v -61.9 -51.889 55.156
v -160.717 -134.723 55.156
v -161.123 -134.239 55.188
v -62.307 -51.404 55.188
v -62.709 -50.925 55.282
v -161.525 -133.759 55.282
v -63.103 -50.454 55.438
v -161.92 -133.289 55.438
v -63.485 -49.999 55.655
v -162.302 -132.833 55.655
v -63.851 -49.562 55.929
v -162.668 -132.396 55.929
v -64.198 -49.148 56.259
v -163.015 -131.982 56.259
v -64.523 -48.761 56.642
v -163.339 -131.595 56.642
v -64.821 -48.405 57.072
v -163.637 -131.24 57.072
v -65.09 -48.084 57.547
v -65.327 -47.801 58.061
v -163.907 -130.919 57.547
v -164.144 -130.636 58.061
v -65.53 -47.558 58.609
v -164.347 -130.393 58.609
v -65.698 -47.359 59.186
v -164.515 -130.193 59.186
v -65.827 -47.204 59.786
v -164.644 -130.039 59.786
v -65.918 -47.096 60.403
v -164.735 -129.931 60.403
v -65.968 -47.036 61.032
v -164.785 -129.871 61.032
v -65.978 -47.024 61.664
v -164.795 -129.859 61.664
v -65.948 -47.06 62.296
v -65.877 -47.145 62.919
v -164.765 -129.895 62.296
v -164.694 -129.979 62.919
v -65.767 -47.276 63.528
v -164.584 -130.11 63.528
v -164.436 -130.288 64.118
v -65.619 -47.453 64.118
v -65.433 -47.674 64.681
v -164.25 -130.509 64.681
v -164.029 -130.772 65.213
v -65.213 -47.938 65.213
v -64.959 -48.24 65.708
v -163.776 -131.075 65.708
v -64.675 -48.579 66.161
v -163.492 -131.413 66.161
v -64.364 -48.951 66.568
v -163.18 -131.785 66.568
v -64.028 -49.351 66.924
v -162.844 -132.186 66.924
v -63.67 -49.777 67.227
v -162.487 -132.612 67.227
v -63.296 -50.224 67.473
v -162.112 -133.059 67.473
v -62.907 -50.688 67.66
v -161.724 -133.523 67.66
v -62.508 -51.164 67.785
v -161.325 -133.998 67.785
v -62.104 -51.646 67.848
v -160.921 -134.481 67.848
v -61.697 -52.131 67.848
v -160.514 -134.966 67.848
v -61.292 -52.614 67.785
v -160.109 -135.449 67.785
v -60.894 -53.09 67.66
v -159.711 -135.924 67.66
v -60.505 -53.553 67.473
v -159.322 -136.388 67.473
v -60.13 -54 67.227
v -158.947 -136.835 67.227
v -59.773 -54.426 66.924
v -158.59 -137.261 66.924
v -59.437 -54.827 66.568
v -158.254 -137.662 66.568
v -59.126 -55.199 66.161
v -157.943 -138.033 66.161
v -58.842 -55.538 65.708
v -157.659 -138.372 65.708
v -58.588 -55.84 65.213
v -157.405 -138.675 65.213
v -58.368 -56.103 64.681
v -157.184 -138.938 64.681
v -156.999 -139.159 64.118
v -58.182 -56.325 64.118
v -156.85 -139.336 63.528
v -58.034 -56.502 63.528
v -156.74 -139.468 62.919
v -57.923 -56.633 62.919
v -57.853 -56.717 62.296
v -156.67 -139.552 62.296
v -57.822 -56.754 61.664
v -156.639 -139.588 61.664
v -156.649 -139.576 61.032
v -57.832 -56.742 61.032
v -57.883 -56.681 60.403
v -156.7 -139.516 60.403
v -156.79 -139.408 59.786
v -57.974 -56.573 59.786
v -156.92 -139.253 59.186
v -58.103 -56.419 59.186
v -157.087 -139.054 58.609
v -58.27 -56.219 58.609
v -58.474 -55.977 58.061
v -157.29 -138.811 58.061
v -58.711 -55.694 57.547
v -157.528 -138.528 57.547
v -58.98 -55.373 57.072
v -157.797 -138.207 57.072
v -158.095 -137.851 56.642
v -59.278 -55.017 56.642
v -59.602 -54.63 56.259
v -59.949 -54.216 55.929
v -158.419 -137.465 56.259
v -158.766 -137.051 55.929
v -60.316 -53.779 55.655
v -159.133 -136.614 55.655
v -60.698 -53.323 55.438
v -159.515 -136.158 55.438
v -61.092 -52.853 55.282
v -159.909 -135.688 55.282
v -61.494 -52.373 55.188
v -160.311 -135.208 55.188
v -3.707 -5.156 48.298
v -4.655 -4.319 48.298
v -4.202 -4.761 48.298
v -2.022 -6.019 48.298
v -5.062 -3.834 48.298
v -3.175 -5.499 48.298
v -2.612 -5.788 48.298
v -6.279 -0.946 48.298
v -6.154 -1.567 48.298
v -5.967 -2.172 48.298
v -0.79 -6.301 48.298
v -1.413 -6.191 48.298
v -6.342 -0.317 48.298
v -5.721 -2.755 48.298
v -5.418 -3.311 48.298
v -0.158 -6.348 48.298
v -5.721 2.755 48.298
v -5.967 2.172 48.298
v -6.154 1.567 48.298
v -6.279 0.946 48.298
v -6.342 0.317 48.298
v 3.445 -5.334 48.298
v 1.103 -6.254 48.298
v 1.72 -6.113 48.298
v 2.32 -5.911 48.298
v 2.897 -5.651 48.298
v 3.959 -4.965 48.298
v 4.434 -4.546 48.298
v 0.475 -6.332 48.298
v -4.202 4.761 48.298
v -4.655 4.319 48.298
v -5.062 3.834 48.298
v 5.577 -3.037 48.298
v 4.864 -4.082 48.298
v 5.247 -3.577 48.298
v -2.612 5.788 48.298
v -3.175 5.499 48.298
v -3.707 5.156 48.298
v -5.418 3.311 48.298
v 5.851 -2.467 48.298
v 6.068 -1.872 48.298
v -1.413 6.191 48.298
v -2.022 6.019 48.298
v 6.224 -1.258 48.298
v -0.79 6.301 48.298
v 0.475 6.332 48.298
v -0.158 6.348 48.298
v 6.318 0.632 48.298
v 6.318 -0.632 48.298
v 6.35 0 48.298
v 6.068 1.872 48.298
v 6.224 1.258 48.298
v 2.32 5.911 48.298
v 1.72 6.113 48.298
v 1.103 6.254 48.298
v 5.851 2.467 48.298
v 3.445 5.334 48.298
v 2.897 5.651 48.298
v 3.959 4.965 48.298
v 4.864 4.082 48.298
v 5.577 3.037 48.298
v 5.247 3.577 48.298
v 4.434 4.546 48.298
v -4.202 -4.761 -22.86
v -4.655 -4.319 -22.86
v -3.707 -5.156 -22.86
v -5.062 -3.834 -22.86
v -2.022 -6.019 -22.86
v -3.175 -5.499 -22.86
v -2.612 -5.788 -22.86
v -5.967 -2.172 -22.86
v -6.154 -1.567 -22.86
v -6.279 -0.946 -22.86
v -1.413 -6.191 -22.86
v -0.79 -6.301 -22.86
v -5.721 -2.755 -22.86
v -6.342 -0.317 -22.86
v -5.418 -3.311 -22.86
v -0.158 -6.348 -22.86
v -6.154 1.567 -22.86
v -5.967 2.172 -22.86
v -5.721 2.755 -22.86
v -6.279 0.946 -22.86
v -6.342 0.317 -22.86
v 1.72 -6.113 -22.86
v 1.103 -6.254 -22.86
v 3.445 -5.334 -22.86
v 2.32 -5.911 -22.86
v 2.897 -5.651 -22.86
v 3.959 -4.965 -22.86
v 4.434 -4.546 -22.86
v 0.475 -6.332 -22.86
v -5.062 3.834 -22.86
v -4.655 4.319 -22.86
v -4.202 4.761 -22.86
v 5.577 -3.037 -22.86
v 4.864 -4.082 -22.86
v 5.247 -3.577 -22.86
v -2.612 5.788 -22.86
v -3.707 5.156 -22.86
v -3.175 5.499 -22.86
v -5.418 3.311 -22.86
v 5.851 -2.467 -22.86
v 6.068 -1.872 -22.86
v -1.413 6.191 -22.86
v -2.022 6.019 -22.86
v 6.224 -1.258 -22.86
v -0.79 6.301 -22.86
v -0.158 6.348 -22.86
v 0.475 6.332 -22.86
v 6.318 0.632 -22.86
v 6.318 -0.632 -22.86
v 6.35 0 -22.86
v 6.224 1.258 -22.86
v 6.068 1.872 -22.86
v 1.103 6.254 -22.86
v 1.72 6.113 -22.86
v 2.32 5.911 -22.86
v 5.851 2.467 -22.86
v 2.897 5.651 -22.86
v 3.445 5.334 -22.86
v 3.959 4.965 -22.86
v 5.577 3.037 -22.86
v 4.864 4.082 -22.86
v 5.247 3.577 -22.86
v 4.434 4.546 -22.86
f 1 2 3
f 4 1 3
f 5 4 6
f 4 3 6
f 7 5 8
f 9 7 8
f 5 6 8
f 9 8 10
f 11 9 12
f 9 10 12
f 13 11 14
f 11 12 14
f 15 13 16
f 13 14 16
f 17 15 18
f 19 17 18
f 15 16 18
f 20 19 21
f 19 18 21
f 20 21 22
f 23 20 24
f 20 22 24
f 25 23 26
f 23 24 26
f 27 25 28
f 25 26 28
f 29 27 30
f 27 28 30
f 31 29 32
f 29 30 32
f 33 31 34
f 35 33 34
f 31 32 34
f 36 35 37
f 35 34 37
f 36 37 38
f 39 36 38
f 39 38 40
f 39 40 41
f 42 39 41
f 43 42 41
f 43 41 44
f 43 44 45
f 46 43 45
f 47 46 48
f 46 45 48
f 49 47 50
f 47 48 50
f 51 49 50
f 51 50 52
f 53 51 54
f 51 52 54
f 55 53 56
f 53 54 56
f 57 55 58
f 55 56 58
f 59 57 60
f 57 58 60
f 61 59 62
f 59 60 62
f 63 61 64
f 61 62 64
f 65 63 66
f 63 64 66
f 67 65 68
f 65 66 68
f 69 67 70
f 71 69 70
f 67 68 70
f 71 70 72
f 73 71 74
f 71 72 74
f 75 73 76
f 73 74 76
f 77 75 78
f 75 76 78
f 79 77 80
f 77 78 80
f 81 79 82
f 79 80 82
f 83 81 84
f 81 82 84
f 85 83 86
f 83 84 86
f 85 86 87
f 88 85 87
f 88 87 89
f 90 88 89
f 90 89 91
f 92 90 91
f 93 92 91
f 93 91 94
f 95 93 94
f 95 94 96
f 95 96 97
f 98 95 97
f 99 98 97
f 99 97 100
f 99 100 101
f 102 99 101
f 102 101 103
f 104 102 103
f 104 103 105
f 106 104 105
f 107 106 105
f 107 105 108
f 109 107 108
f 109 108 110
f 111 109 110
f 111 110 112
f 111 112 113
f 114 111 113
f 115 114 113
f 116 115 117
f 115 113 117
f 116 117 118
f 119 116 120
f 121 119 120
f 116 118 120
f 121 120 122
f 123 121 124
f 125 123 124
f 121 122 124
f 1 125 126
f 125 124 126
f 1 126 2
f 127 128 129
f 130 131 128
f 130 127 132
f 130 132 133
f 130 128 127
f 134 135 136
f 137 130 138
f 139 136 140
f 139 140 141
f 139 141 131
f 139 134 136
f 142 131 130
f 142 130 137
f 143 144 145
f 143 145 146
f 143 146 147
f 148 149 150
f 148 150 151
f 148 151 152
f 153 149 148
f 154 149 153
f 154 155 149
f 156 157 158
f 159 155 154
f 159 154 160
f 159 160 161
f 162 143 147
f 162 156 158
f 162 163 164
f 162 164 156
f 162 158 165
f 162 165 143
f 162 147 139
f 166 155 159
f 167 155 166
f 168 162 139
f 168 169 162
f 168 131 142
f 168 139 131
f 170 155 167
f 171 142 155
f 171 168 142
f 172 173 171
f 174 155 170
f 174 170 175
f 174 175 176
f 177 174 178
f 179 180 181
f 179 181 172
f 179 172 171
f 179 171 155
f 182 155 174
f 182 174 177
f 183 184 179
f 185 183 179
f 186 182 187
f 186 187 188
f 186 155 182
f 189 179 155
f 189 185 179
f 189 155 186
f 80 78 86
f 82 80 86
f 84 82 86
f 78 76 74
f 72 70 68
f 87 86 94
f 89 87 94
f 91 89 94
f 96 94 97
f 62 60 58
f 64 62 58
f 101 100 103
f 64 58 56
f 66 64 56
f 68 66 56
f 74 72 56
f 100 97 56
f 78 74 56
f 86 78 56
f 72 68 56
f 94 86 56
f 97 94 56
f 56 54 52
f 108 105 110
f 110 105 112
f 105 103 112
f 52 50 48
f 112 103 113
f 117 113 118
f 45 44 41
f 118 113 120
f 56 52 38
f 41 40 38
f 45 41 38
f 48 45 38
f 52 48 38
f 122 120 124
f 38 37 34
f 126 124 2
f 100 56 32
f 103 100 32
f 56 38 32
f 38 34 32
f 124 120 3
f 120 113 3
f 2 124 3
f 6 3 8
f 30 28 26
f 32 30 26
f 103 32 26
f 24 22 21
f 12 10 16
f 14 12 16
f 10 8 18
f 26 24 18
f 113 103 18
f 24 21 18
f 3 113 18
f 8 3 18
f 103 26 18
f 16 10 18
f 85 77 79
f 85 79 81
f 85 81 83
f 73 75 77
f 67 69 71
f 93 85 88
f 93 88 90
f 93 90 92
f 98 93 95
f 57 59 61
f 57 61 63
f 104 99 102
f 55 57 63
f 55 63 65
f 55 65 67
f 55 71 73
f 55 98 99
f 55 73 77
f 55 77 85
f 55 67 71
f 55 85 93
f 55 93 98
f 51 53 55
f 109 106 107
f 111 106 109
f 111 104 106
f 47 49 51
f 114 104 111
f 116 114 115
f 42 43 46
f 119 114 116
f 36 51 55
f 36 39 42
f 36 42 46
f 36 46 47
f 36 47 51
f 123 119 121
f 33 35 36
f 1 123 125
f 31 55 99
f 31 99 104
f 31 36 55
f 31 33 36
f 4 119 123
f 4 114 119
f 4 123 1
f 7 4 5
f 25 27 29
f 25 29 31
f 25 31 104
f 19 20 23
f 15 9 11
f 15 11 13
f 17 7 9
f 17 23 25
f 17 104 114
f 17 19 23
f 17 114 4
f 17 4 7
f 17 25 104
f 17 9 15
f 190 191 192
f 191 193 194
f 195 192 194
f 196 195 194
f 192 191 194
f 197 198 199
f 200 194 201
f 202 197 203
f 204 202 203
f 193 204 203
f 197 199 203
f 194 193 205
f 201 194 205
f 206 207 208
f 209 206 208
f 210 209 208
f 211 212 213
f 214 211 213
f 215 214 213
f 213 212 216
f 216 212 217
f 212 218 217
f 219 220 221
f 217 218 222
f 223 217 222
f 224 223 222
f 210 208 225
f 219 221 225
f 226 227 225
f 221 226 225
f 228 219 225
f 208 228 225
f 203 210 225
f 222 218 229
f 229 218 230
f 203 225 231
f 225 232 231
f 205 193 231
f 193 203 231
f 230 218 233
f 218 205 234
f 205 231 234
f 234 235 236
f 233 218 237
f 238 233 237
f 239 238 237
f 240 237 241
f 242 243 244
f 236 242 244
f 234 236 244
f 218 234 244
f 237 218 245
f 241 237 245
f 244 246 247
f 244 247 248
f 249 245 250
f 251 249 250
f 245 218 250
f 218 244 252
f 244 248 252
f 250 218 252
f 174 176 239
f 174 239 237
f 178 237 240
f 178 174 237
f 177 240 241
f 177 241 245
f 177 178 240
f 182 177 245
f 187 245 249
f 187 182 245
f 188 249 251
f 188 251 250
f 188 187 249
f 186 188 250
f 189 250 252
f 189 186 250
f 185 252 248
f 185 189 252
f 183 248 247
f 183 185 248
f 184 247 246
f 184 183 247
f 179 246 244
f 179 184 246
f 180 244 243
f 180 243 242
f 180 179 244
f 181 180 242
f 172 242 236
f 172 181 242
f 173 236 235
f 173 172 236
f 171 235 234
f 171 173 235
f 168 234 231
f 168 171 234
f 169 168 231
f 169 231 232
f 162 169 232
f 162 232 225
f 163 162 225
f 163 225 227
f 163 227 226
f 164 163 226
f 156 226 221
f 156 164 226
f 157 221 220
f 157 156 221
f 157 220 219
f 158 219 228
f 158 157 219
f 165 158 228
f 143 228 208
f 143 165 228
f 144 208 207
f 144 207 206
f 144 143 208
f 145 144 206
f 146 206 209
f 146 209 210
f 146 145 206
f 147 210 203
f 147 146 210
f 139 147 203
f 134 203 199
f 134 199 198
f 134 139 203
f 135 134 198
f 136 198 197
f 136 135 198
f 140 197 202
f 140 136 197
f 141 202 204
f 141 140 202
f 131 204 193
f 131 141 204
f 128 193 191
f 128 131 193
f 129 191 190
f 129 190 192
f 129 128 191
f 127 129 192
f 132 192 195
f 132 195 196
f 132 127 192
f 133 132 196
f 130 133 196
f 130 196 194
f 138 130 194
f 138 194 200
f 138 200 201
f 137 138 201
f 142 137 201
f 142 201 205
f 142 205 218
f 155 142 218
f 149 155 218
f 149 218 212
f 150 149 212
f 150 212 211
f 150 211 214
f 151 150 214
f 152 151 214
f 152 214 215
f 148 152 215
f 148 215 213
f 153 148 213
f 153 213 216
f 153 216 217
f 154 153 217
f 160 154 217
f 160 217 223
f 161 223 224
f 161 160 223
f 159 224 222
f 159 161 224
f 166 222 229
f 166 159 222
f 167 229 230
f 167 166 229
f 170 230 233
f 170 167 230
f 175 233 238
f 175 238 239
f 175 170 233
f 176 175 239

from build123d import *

# Parameters (mm, degrees)
BOSS_EXTRUDE1_OUTLINE_R = 6.35
BOSS_EXTRUDE1_DEPTH     = 128.9431
SKETCH3_R               = 6.35
BOSS_EXTRUDE2_DEPTH     = 71.1581


# Read off the part's stored shape, not the designer's step: Boss-Extrude1
with BuildPart() as part:
    # Boss-Extrude1 outline → Boss-Extrude1 (new body)
    with BuildSketch(Plane(origin=(-160.717192238, -134.723447429, 0), x_dir=(0, 0, -1), z_dir=(0.7663596576395588, 0.6424117644802112, 0))):
        with Locations((-61.5061, 0)):
            Circle(BOSS_EXTRUDE1_OUTLINE_R)
    extrude(amount=BOSS_EXTRUDE1_DEPTH)


with BuildPart() as body_2:
    # Sketch3 → Boss-Extrude2 (new body)
    with BuildSketch(Plane.XY.offset(48.2981)):
        Circle(SKETCH3_R)
    extrude(amount=-BOSS_EXTRUDE2_DEPTH)


solid = Compound([part.part, body_2.part])
